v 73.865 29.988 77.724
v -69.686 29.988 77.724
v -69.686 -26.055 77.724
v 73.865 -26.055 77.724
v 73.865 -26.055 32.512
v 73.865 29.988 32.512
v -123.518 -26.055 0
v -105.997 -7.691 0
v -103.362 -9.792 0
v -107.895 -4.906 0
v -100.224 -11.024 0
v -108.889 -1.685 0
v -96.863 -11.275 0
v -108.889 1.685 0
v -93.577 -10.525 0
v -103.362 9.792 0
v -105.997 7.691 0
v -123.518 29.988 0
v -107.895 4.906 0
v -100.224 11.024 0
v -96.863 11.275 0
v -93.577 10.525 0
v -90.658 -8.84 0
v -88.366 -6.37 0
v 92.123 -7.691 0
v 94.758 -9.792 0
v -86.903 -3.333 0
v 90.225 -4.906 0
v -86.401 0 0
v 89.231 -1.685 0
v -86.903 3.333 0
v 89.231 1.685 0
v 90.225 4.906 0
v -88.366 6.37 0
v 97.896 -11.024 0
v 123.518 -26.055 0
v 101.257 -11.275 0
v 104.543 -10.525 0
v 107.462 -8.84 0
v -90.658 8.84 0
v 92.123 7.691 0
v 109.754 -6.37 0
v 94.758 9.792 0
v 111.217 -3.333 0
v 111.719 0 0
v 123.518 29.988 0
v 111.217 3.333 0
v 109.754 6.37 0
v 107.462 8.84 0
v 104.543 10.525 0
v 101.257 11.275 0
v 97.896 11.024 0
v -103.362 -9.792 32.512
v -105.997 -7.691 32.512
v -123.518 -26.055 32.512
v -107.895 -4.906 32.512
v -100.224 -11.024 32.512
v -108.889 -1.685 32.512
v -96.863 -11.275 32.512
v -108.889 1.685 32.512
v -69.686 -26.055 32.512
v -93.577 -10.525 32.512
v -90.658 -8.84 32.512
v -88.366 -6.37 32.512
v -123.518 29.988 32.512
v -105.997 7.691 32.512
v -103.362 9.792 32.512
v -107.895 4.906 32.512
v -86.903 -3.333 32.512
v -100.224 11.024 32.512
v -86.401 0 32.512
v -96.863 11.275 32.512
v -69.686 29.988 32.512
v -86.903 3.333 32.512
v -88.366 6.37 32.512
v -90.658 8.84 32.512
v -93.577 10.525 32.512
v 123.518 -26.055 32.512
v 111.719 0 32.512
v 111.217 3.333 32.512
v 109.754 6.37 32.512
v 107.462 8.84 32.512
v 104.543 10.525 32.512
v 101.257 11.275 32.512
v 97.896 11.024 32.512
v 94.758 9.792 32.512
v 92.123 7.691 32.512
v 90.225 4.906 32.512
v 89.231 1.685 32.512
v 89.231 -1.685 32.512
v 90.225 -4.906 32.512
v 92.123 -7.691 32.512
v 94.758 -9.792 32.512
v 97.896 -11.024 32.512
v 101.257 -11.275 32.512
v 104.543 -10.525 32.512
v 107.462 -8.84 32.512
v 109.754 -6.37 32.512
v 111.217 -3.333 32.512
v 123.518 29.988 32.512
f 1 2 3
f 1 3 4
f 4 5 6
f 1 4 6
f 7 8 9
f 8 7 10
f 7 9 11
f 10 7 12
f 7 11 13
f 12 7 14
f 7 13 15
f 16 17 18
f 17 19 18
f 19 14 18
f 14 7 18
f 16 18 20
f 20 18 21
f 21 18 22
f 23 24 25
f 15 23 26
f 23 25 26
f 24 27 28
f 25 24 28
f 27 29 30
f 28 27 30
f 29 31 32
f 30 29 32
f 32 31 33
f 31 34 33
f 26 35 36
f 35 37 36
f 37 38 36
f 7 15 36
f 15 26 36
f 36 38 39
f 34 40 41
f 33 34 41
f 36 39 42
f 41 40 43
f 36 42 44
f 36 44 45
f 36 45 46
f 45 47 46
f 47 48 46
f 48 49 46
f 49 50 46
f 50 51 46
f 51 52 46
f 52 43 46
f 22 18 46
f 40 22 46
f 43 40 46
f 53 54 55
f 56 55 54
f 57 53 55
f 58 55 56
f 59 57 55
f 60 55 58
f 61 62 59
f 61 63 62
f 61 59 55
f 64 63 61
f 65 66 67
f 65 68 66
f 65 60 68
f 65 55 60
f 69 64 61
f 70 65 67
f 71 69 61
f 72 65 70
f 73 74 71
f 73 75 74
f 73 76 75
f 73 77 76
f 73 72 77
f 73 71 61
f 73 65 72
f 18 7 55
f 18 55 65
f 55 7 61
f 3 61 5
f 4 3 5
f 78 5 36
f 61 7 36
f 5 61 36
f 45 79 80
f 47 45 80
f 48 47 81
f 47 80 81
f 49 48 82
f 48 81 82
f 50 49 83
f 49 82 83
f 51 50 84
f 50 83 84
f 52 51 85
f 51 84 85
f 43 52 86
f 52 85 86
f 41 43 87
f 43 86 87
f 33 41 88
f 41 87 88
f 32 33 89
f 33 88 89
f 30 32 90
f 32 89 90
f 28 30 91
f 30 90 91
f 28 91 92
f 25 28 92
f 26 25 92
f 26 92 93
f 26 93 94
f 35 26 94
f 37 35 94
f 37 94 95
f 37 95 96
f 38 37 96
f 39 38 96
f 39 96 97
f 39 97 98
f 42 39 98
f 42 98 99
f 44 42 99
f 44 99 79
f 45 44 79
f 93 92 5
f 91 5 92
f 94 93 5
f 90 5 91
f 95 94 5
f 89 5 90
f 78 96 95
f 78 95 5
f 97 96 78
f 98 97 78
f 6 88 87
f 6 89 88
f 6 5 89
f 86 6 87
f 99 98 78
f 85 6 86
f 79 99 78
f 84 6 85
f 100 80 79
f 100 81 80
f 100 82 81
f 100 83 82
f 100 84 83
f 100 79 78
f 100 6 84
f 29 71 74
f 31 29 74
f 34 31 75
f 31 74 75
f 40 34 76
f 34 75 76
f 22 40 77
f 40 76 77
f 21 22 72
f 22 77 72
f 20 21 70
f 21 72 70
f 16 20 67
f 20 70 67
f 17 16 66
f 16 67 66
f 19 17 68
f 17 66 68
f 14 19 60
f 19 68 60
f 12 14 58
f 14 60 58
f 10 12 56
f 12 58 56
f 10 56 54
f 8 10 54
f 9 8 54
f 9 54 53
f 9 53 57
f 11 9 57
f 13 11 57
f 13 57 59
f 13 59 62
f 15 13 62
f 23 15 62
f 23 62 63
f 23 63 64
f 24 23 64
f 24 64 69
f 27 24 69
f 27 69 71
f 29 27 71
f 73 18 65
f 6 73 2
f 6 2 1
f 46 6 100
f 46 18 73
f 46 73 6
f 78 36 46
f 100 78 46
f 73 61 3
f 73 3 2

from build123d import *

# Parameters (mm, degrees)
F0_W     = 247.035488
F0_H     = 56.043873
F1_DEPTH = 32.512
F2_R     = 11.307097
F3_DEPTH = 43.434
F4_W     = 143.55097
F4_H     = 56.043873
F5_DEPTH = 45.212


with BuildPart() as f1:
    # F0 (on Top) → F1 (new body)
    with BuildSketch(Plane.XY):
        with Locations((0, 1.966451)):
            Rectangle(F0_W, F0_H)
    extrude(amount=F1_DEPTH)

    # F2 (on face) → F3 (cut)
    with BuildSketch(Plane.XY.offset(32.512)):
        with Locations((100.411944, 0)):
            Circle(F2_R)
        with Locations((-97.708069, 0)):
            Circle(F2_R)
    extrude(amount=-F3_DEPTH, mode=Mode.SUBTRACT)

    # F4 (on face) → F5 (join)
    with BuildSketch(Plane.XY.offset(32.512)):
        with Locations((2.089355, 1.966451)):
            Rectangle(F4_W, F4_H)
    extrude(amount=F5_DEPTH)


solid = f1.part
